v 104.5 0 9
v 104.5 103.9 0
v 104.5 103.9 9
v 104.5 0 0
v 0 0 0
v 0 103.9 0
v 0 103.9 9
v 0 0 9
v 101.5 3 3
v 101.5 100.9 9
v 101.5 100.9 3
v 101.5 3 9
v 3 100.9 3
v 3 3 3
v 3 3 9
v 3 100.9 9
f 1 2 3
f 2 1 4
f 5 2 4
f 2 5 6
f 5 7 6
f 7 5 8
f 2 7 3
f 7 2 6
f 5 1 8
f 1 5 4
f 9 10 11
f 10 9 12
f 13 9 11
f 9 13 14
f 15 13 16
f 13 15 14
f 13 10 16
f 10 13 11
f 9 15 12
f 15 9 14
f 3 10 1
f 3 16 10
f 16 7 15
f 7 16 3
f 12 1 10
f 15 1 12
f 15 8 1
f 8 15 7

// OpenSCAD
// file: ../lib/shell.scad
// ============================================================================
// SHELL — one solid, cut three ways
// ============================================================================
// The case is a single hollow box. base, shell and roof are that box intersected
// with three disjoint claims that together account for all of it. Cutting one solid
// rather than modelling three parts means the walls cannot disagree about where they
// are: there is one outer surface and one inner surface in the whole project.
//
// THE CLAIMS MUST BE DISJOINT AND COMPLETE. Overlapping claims print two parts that
// cannot both be in the case; claims that leave a gap print a case with a band
// missing. Both render, export and count one body. scripts/test-parts.sh checks each
// direction, because neither implies the other.
// ============================================================================

include <../config.scad>

// Seam heights. The base takes the floor plus a short skirt so its joint is off the
// floor line, and the roof takes the ceiling plus a matching skirt.
base_h = wall + 6;
roof_h = wall + 6;

assert(base_h + roof_h < outer[2],
       "base and roof skirts have eaten the whole case — nothing left for the walls");

// ----------------------------------------------------------------------------
// THE SOLID
// ----------------------------------------------------------------------------

module shellSolid() {
  difference() {
    cube(outer);
    translate([wall, wall, wall]) cube([interior_x, interior_y, interior_h]);
  }
}

// ----------------------------------------------------------------------------
// CLAIMS
// ----------------------------------------------------------------------------
// Each is [origin, size] in the case's frame, spanning the full footprint and
// differing only in z. Returned as data rather than drawn so tests.scad can reason
// about them without re-deriving the numbers.
function claim(which) =
    which == "base"  ? [[0, 0, 0],                  [outer[0], outer[1], base_h]]
  : which == "roof"  ? [[0, 0, outer[2] - roof_h],  [outer[0], outer[1], roof_h]]
  :                    [[0, 0, base_h],             [outer[0], outer[1],
                                                     outer[2] - base_h - roof_h]];

module claimVolume(which, grow = 0) {
  c = claim(which);
  translate(c[0] - [grow, grow, grow])
    cube(c[1] + [2 * grow, 2 * grow, 2 * grow]);
}

// ----------------------------------------------------------------------------
// PANELS
// ----------------------------------------------------------------------------

// render() is NOT optional. Preview does not evaluate booleans -- it flattens the
// model into a sum of products, which is exponential in nested differences. A panel
// that is the shell intersected with its claim and then cut by ports and vents passes
// OpenSCAD's normalisation limit, at which point it aborts and shows a BLANK WINDOW
// while exporting perfectly the whole time.
//
// The claim is NOT grown here. A claim grown in z would overlap its neighbour, and
// these three tile the case exactly; growth belongs on bosses and tenons, which ask
// for slightly more than they occupy so a neighbour's subtraction cannot leave a
// zero-volume skin.
module shellPanel(which) {
  render()
    intersection() {
      shellSolid();
      claimVolume(which);
    }
}
// main file
// ============================================================================
// base — printed part
// ============================================================================
// Cut from the one shellSolid() in lib/shell.scad. Everything this part is, it is
// because of its claim; nothing here re-derives a wall position.
// ============================================================================

include <../config.scad>
use <../lib/shell.scad>

module basePart() {
  shellPanel("base");
}

basePart();
